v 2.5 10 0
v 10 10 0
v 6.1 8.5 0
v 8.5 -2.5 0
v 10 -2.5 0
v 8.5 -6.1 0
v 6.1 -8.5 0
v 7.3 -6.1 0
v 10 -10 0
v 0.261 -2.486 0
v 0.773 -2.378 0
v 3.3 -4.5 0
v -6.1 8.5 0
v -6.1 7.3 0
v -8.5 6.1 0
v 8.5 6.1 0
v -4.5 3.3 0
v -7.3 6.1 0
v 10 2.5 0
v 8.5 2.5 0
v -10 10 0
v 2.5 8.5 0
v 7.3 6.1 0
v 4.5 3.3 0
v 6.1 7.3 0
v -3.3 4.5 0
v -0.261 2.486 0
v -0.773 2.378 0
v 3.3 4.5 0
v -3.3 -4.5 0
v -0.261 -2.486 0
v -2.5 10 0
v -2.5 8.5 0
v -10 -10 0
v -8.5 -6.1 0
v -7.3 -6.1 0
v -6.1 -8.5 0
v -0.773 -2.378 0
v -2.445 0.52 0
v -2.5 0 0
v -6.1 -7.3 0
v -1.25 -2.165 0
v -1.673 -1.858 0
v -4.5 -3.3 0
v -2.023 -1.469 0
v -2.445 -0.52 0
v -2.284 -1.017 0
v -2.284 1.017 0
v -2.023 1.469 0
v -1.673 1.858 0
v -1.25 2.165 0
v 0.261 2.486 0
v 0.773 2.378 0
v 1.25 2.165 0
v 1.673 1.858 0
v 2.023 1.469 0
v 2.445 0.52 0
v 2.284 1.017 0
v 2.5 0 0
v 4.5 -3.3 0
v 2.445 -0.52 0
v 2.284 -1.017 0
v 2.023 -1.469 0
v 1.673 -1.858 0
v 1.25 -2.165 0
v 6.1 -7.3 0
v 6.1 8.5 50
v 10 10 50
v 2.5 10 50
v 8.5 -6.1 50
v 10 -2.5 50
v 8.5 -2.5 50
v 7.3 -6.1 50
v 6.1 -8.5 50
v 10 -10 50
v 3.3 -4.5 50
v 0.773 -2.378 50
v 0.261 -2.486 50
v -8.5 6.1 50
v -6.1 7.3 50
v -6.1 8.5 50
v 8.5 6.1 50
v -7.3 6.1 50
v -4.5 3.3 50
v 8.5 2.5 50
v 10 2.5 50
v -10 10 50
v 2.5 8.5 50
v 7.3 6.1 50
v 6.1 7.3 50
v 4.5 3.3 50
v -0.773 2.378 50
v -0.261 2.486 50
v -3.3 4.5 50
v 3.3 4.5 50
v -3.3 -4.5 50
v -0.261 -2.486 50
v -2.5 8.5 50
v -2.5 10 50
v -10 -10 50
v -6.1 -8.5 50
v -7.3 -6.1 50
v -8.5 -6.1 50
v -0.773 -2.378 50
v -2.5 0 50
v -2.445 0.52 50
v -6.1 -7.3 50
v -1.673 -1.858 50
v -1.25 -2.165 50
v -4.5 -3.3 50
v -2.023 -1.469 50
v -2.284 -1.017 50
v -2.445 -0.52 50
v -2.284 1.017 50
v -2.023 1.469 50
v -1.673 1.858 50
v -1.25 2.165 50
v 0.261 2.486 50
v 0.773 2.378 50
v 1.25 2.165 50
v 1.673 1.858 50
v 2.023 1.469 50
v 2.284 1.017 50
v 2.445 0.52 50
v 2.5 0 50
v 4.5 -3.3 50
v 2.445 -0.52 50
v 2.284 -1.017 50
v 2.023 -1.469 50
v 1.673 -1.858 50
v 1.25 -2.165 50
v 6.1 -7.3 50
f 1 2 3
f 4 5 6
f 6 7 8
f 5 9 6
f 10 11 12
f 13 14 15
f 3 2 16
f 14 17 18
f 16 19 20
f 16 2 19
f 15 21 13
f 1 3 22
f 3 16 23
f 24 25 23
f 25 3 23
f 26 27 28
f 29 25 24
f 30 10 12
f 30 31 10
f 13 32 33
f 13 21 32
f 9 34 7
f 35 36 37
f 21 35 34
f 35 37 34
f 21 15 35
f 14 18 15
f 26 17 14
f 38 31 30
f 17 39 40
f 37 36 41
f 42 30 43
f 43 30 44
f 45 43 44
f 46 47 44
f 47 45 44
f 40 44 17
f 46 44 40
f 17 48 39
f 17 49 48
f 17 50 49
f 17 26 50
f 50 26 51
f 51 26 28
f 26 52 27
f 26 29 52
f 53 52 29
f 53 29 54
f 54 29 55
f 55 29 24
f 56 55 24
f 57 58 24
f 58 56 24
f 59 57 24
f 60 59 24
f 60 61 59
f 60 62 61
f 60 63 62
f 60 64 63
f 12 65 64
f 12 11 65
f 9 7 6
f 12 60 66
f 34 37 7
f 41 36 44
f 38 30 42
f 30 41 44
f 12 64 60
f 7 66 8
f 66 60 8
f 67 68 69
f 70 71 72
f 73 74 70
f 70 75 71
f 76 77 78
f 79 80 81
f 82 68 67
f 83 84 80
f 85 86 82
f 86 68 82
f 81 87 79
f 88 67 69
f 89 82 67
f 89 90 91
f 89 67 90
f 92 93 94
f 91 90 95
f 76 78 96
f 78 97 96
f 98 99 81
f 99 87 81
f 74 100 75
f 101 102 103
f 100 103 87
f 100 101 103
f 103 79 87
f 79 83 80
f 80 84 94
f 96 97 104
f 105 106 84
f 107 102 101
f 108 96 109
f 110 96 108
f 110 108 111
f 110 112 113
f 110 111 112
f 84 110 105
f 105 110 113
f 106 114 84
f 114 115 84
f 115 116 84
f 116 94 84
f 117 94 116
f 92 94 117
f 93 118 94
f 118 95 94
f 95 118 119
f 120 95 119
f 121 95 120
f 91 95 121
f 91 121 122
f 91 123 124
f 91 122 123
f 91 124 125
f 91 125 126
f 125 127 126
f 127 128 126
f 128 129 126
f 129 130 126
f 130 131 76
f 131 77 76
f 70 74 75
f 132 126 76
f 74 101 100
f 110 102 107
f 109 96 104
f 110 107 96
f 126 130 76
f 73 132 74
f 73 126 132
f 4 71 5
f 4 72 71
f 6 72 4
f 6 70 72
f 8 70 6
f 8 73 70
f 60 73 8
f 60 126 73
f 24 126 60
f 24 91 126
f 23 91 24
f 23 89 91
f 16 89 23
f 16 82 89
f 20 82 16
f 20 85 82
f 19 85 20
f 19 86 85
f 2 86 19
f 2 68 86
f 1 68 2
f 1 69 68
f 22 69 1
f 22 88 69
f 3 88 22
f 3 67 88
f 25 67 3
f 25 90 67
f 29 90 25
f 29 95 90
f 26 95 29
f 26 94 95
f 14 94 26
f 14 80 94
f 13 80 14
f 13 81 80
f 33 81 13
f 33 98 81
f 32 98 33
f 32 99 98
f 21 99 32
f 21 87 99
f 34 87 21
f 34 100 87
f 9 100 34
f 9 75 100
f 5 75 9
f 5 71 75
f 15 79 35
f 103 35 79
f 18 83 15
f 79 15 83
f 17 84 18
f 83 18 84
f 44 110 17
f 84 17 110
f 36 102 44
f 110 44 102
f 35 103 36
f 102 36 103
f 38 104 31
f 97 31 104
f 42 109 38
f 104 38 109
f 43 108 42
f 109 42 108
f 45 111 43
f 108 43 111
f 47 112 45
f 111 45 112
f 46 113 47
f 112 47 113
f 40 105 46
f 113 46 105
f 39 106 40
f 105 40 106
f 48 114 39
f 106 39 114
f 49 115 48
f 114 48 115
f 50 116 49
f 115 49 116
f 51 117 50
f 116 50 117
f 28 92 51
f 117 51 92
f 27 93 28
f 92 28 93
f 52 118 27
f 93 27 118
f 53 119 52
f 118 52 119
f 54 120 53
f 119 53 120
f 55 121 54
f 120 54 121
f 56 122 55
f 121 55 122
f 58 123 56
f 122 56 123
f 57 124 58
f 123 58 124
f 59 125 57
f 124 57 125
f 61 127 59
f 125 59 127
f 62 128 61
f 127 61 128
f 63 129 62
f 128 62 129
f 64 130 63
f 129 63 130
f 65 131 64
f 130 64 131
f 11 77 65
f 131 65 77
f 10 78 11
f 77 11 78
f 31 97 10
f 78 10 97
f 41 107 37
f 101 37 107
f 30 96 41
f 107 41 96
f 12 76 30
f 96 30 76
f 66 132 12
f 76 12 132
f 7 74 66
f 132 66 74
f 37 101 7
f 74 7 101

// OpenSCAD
// Generates T-Slot extrusion profiles

// Length - Maximum is your Z-Axis height
ExtrusionLength = 50;
// Profile Width/Height
Outer = 20;
// Outer Wall Thickness
Wall = 1.5;
// Center Hole Diameter
CenterHoleDiam = 5;
// Number of Slots
NumSlots = 2; // [0,1,2,3,4]
// For 2 slots only: Corner or Opposite Sides?
Corner = 1; // [0:No,1:Yes]

// Slot Opening Width
SlotW = 5.0;
// Slot Inside Width
InsideW = 12.2;
// Depth of Wide Part of Slot
Flat = 1.2;
// Total depth of slot (inner part only)
Depth = 4;

// Max segment width for holes
$fs=0.5;

// Derived Parameters
Inner = Outer/2 - Wall;
BottomW = InsideW - 2*tan(45)*(Depth - Flat);

Slot0 = [Inner + Wall + 1, -SlotW/2];
Slot1 = [Inner + Wall + 1, SlotW/2];
Slot2 = [Inner, SlotW/2];
Slot3 = [Inner, InsideW/2];
Slot4 = [Inner - Flat, InsideW/2];
Slot5 = [Inner - Depth, BottomW/2];
Slot6 = [Inner - Depth, -BottomW/2];
Slot7 = [Inner - Flat,-InsideW/2];
Slot8 = [Inner, -InsideW/2];
Slot9 = [Inner, -SlotW/2];

module OpenSlot(){
	polygon([Slot0,Slot1,Slot2,Slot3,Slot4,Slot5,Slot6,Slot7,Slot8,Slot9]);
}

module ClosedSlot(){
	polygon([Slot2,Slot3,Slot4,Slot5,Slot6,Slot7,Slot8,Slot9]);
}

module SquareProfile(){
	linear_extrude(height = ExtrusionLength)
	difference(){
		square([Outer,Outer],center=true);
		// Remove Inner Hole
		circle(d = CenterHoleDiam);
		// Remove Slots
		// First Position - Zero Degrees
		if(NumSlots > 0) OpenSlot();
		else ClosedSlot();
		// Second Position - 90 Degrees
		rotate([0,0,90])
		if((NumSlots > 2)||
			((NumSlots == 2)&&(Corner == 1)))
			OpenSlot();
		else ClosedSlot();
		// Third Position - 180 Degrees
		rotate([0,0,180])
			if((NumSlots > 2)||
				((NumSlots == 2)&&(Corner == 0)))
				OpenSlot();
		else ClosedSlot();
		// Fourth Position - 270 Degrees
		rotate([0,0,270])
		if(NumSlots > 3) OpenSlot();
		else ClosedSlot();
	}
}

SquareProfile();
